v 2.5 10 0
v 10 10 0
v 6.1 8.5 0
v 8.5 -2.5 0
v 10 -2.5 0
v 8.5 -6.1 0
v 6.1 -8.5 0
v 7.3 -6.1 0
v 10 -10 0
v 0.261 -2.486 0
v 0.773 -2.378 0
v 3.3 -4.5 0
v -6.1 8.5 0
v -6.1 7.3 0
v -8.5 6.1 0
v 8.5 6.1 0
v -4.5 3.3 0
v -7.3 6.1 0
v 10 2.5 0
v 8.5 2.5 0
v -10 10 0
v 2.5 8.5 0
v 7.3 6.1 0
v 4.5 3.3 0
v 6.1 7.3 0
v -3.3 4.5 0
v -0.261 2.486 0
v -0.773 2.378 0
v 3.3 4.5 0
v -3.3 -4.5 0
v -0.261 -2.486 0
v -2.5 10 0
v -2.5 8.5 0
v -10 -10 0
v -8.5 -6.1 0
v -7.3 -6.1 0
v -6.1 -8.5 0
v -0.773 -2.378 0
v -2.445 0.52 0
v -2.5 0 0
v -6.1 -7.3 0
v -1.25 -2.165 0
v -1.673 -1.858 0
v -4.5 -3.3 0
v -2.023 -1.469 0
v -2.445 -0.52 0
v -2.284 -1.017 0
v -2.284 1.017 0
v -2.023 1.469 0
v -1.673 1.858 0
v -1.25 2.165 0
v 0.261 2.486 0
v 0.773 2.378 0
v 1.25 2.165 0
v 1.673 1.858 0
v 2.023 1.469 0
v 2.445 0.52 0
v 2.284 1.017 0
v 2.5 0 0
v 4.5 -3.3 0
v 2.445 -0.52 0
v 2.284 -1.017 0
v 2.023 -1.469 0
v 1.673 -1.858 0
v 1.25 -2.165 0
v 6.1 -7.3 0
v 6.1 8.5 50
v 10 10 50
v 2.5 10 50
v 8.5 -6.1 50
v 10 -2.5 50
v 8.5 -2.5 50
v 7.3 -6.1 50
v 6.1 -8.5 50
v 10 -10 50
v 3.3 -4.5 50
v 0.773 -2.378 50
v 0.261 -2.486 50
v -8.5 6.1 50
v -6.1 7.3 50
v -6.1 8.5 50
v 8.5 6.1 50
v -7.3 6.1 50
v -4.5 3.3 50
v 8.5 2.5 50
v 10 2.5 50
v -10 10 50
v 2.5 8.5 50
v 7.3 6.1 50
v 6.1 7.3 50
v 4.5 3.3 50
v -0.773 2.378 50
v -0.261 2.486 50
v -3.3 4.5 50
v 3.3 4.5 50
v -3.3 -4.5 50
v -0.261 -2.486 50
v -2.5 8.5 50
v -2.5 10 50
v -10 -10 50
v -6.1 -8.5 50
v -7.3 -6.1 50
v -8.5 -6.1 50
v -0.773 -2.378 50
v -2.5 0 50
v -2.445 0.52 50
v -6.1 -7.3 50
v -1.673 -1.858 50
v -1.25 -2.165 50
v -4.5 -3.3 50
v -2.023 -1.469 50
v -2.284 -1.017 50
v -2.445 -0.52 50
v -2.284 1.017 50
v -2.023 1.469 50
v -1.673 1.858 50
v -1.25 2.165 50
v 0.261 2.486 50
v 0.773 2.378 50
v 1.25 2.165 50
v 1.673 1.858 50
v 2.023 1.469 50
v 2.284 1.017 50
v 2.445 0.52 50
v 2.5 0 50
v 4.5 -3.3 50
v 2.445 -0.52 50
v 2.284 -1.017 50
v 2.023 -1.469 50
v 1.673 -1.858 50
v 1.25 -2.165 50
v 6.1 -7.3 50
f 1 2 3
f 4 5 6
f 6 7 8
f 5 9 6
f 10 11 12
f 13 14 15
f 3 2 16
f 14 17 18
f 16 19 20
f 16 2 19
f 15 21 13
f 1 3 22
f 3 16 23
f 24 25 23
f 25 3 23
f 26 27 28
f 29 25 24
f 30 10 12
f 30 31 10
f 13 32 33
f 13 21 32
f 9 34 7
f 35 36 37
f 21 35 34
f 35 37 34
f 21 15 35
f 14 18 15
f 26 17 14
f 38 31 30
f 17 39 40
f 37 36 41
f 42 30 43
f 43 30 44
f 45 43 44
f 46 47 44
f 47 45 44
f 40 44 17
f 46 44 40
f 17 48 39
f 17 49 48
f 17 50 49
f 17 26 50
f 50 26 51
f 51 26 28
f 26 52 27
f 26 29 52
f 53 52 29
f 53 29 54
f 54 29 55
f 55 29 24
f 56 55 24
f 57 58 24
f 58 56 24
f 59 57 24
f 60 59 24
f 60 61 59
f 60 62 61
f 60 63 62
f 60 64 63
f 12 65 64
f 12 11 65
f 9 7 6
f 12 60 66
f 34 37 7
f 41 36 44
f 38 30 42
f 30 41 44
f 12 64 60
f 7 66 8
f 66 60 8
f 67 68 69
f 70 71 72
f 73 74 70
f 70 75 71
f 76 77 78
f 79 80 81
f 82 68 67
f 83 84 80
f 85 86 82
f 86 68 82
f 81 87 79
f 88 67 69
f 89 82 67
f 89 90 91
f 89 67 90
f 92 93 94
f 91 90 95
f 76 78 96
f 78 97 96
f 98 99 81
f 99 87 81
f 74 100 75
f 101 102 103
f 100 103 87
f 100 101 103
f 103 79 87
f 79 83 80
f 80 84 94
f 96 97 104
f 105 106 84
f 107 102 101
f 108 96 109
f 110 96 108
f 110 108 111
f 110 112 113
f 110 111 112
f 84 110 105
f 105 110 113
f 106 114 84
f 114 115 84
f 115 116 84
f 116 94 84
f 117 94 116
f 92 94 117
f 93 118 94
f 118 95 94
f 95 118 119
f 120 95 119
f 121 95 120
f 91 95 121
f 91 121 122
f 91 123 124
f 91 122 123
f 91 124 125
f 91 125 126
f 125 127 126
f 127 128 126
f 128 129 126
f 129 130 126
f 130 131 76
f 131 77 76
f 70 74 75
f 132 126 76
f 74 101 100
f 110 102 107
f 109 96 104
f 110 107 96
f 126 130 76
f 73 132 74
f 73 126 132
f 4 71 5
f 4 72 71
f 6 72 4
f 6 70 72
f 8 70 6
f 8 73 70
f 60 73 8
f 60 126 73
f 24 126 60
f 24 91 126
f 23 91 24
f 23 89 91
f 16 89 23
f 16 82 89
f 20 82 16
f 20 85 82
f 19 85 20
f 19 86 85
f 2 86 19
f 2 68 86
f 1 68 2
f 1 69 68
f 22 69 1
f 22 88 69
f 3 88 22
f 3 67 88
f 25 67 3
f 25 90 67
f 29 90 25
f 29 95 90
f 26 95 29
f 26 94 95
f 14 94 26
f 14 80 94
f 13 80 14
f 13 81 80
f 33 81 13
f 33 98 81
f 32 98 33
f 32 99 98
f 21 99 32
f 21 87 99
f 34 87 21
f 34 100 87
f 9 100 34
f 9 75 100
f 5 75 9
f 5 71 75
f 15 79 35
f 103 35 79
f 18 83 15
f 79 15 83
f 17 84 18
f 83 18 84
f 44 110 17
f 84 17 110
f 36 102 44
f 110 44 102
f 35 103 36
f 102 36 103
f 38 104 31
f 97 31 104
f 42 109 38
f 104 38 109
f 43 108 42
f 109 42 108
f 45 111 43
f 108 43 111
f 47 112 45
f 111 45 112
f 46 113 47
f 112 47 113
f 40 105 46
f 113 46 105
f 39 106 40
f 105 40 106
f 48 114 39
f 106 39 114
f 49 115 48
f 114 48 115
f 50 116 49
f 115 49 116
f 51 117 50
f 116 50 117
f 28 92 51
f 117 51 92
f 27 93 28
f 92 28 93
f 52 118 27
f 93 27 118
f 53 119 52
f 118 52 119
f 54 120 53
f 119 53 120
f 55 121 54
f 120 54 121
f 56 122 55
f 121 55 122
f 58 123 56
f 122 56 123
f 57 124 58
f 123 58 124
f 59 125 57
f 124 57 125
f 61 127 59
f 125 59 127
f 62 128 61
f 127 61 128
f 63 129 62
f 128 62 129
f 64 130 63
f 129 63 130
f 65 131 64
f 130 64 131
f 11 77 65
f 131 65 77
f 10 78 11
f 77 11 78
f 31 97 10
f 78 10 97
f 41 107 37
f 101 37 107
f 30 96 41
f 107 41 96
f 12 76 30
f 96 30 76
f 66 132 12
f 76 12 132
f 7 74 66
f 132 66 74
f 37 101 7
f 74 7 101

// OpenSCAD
// Generates T-Slot extrusion profiles

// Length - Maximum is your Z-Axis height
ExtrusionLength = 50;
// Profile Width/Height
Outer = 20;
// Outer Wall Thickness
Wall = 1.5;
// Center Hole Diameter
CenterHoleDiam = 5;
// Number of Slots
NumSlots = 2; // [0,1,2,3,4]
// For 2 slots only: Corner or Opposite Sides?
Corner = 1; // [0:No,1:Yes]

// Slot Opening Width
SlotW = 5.0;
// Slot Inside Width
InsideW = 12.2;
// Depth of Wide Part of Slot
Flat = 1.2;
// Total depth of slot (inner part only)
Depth = 4;

// Max segment width for holes
$fs=0.5;

// Derived Parameters
Inner = Outer/2 - Wall;
BottomW = InsideW - 2*tan(45)*(Depth - Flat);

Slot0 = [Inner + Wall + 1, -SlotW/2];
Slot1 = [Inner + Wall + 1, SlotW/2];
Slot2 = [Inner, SlotW/2];
Slot3 = [Inner, InsideW/2];
Slot4 = [Inner - Flat, InsideW/2];
Slot5 = [Inner - Depth, BottomW/2];
Slot6 = [Inner - Depth, -BottomW/2];
Slot7 = [Inner - Flat,-InsideW/2];
Slot8 = [Inner, -InsideW/2];
Slot9 = [Inner, -SlotW/2];

module OpenSlot(){
	polygon([Slot0,Slot1,Slot2,Slot3,Slot4,Slot5,Slot6,Slot7,Slot8,Slot9]);
}

module ClosedSlot(){
	polygon([Slot2,Slot3,Slot4,Slot5,Slot6,Slot7,Slot8,Slot9]);
}

module SquareProfile(){
	linear_extrude(height = ExtrusionLength)
	difference(){
		square([Outer,Outer],center=true);
		// Remove Inner Hole
		circle(d = CenterHoleDiam);
		// Remove Slots
		// First Position - Zero Degrees
		if(NumSlots > 0) OpenSlot();
		else ClosedSlot();
		// Second Position - 90 Degrees
		rotate([0,0,90])
		if((NumSlots > 2)||
			((NumSlots == 2)&&(Corner == 1)))
			OpenSlot();
		else ClosedSlot();
		// Third Position - 180 Degrees
		rotate([0,0,180])
			if((NumSlots > 2)||
				((NumSlots == 2)&&(Corner == 0)))
				OpenSlot();
		else ClosedSlot();
		// Fourth Position - 270 Degrees
		rotate([0,0,270])
		if(NumSlots > 3) OpenSlot();
		else ClosedSlot();
	}
}

SquareProfile();
